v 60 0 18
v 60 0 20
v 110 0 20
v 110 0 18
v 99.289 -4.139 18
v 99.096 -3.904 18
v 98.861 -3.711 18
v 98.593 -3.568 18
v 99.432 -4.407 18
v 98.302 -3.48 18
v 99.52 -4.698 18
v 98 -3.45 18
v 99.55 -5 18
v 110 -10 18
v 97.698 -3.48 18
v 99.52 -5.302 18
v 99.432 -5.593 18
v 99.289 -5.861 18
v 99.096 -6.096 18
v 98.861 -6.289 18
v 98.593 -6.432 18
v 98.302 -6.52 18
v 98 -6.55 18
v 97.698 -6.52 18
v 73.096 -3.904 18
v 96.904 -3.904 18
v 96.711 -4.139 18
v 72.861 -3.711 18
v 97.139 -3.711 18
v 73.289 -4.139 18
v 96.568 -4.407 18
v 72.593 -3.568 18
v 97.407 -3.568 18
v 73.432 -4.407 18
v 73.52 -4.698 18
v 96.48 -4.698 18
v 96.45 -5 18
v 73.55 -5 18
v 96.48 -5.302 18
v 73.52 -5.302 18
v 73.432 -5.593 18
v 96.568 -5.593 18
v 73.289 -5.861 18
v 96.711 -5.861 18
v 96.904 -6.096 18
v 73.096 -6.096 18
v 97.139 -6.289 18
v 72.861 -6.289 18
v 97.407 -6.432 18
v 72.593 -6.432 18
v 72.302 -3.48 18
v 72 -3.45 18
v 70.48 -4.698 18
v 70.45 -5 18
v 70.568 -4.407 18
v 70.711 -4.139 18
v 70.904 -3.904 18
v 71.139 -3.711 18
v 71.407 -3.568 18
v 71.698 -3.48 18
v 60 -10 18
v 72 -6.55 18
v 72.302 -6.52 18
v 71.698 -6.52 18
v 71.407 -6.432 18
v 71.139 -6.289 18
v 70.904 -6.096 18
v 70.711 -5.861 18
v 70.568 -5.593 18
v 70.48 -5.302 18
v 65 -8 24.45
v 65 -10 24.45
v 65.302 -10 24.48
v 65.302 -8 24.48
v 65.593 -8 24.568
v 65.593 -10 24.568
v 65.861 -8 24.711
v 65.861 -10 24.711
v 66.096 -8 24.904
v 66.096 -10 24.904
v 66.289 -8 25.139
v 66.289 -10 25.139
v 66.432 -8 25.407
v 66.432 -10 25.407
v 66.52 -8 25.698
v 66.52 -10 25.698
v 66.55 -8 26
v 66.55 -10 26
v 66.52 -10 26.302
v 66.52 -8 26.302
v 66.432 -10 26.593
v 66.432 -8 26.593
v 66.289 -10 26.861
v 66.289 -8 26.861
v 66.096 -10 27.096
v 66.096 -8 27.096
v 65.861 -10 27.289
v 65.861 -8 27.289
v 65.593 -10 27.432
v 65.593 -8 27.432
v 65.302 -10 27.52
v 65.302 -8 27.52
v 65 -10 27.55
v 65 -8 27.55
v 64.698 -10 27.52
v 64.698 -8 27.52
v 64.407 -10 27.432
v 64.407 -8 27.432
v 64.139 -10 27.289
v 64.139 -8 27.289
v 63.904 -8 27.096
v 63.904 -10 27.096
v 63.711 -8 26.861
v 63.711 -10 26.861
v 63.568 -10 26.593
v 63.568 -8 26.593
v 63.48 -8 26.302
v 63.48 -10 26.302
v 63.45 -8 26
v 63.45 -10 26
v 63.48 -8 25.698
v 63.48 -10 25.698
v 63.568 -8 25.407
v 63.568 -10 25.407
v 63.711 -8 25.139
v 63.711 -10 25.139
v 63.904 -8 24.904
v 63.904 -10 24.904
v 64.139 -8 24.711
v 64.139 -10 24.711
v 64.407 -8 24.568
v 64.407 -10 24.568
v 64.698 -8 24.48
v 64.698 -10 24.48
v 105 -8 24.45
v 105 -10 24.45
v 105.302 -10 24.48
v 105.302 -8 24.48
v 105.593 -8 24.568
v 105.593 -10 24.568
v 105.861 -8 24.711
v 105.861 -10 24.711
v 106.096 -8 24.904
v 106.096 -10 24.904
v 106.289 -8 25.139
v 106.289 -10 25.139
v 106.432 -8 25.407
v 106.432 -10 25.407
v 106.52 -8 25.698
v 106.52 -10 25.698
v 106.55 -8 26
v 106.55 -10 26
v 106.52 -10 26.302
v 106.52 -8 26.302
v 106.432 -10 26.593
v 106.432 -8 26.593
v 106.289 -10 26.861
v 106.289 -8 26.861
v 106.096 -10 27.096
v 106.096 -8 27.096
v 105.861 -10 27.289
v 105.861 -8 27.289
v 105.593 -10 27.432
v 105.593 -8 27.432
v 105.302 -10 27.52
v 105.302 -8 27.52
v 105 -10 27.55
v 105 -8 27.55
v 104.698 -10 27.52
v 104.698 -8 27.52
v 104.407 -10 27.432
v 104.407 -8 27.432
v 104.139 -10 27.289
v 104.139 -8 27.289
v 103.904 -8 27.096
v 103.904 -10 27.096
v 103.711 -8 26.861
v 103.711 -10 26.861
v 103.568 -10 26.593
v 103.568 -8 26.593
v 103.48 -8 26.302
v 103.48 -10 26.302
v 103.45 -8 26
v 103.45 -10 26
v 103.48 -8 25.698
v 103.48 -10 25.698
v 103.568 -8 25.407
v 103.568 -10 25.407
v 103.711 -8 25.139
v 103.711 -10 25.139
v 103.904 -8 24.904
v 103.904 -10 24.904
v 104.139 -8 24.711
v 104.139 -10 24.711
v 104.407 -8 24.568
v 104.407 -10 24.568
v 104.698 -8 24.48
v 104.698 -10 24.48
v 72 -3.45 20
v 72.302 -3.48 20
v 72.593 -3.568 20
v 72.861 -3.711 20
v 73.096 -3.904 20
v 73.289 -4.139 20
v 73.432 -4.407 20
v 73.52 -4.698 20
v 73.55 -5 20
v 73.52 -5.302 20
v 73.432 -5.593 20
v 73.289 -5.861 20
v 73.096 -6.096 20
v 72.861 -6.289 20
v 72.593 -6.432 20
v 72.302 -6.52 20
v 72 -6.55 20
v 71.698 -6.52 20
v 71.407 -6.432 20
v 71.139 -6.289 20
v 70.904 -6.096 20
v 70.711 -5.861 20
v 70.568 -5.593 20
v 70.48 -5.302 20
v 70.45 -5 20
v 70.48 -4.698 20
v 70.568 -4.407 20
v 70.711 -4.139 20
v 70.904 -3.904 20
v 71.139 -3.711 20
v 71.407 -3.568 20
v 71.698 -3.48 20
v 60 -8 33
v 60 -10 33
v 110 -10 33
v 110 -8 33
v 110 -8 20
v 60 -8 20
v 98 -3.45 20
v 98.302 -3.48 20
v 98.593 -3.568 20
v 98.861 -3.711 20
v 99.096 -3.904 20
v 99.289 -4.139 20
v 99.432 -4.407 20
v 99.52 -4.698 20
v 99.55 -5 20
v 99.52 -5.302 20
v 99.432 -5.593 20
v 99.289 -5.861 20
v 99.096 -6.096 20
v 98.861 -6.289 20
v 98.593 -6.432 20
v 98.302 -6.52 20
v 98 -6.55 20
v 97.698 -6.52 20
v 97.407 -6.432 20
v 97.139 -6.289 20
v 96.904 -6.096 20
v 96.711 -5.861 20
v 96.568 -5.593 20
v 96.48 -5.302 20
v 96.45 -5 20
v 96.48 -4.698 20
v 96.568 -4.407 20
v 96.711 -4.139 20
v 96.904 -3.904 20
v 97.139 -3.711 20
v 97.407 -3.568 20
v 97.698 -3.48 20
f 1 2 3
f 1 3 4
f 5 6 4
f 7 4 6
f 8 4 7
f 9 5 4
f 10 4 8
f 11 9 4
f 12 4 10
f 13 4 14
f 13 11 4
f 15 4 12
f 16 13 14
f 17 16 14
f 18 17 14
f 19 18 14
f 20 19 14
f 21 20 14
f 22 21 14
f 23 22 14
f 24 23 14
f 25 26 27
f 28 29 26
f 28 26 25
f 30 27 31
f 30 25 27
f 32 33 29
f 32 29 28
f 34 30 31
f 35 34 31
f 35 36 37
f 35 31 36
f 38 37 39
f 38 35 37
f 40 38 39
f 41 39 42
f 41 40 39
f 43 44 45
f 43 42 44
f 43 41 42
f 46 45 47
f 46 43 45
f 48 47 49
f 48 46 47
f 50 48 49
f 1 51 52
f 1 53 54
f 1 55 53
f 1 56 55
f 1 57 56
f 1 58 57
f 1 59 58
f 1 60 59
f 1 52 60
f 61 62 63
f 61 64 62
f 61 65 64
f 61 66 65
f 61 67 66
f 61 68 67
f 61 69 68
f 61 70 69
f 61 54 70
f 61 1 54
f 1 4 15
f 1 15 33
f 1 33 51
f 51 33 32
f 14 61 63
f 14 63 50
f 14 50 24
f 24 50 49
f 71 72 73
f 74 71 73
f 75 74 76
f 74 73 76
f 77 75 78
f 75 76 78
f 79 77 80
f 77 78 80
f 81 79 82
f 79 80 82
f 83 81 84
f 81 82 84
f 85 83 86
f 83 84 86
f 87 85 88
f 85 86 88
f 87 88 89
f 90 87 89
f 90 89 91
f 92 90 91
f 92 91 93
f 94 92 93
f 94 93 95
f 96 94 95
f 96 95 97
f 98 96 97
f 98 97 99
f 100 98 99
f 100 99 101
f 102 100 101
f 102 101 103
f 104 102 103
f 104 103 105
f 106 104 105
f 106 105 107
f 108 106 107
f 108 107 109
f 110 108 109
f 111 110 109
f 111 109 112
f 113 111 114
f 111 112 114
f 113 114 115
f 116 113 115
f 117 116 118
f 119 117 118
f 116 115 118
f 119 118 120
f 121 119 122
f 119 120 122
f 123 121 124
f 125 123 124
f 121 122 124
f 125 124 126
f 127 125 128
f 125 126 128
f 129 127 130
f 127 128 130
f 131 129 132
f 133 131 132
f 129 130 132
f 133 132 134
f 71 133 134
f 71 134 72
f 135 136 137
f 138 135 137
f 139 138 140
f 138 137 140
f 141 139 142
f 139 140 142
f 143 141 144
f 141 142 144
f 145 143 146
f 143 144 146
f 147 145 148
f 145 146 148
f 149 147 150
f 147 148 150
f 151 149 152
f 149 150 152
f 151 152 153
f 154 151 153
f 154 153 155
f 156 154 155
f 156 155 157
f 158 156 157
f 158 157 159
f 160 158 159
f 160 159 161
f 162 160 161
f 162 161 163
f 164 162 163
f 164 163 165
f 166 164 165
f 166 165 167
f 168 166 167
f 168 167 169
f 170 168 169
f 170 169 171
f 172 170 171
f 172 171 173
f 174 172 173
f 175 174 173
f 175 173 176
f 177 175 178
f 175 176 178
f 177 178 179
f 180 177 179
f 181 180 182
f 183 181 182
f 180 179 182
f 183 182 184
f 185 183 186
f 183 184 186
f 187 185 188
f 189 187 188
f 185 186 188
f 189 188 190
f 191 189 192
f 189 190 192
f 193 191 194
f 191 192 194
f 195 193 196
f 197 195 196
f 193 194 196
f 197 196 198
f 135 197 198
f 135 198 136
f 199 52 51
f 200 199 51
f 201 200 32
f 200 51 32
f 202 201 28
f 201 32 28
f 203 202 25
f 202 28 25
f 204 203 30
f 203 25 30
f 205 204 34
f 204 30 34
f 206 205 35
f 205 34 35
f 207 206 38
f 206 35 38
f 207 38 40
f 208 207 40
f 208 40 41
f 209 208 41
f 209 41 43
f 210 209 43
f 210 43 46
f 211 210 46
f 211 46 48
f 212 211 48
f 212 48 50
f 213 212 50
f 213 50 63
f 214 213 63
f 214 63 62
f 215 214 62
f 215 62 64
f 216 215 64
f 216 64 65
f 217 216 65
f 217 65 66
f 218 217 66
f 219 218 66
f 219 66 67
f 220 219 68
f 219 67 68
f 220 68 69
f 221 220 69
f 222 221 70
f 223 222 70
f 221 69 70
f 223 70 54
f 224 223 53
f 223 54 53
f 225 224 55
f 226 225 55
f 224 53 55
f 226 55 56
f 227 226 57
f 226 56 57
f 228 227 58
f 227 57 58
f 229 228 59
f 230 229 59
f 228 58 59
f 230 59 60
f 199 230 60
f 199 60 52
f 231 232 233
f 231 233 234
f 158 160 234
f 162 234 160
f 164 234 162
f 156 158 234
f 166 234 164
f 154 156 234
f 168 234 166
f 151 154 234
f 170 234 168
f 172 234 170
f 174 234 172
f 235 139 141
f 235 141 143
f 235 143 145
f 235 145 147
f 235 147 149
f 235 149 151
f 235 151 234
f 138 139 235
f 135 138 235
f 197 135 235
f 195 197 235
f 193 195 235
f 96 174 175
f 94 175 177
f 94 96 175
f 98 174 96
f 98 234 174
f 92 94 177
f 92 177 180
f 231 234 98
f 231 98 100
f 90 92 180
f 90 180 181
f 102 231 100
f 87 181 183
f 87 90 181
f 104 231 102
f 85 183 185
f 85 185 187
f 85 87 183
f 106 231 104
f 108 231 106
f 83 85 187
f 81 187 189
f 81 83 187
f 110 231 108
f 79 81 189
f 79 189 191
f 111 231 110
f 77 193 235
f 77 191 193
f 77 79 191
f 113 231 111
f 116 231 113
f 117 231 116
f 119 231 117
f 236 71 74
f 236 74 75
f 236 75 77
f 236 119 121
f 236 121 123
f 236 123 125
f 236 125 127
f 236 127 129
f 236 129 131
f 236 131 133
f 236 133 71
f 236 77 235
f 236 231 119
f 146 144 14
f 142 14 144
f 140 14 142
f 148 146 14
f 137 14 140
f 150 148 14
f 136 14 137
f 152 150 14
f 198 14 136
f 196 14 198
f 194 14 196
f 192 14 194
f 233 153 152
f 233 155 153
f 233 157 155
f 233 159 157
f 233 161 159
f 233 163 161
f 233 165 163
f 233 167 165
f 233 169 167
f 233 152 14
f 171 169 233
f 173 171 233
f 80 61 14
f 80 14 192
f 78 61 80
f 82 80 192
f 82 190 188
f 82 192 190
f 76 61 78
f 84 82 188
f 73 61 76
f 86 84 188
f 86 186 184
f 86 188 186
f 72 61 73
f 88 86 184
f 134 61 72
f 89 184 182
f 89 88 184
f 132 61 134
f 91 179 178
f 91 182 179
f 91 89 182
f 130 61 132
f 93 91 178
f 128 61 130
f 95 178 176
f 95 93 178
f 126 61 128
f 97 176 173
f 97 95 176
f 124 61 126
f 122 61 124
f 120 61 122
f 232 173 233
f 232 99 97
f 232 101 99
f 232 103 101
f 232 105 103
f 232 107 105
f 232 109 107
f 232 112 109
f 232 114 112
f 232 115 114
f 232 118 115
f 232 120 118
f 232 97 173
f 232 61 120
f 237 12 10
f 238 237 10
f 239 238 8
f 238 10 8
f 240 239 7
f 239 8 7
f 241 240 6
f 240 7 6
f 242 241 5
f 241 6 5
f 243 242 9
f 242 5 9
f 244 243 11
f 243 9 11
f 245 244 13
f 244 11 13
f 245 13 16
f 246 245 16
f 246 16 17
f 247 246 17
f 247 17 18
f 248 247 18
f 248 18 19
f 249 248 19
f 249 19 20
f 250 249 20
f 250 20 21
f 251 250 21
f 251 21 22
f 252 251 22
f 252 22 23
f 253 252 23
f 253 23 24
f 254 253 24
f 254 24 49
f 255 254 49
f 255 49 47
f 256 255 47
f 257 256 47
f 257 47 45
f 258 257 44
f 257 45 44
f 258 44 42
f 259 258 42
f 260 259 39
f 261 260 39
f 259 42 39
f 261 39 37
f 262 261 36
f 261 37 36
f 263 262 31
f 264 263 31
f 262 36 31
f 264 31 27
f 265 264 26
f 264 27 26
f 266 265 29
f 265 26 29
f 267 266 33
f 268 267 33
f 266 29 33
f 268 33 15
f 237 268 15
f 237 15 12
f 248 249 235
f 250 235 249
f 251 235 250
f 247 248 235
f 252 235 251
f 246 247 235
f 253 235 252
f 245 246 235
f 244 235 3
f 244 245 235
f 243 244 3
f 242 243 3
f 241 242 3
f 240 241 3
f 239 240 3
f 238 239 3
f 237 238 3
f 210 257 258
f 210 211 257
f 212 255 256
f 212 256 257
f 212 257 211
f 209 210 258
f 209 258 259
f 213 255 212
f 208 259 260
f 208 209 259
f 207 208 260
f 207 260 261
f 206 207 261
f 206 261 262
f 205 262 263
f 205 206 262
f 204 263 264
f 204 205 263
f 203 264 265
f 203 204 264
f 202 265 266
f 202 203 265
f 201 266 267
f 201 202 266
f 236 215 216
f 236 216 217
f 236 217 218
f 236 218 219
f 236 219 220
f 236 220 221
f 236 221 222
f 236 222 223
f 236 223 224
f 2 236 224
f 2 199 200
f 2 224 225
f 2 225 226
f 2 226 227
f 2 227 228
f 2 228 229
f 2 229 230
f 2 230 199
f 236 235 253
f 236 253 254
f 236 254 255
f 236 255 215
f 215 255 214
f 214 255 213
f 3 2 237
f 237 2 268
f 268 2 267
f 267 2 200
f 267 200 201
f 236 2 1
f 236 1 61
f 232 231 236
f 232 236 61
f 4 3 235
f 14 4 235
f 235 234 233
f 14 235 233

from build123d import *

# Parameters (mm, degrees)
PAD041_DEPTH    = 50
SKETCH243_R     = 1.55
POCKET202_DEPTH = 15.001
SKETCH244_R     = 1.55
POCKET203_DEPTH = 10.001


with BuildPart() as part:
    # Sketch242 → Pad041 (new body)
    with BuildSketch(Plane.YZ):
        Polygon((0, 0), (0, 15), (2, 15), (2, 2), (10, 2), (10, 0), align=None)
    extrude(amount=PAD041_DEPTH)

    # Sketch243 (on Face6 of Pad041) → Pocket202 (cut, through all)
    with BuildSketch(Plane.YX):
        with Locations((5, 38)):
            Circle(SKETCH243_R)
        with Locations((5, 12)):
            Circle(SKETCH243_R)
    extrude(amount=-POCKET202_DEPTH, mode=Mode.SUBTRACT)

    # Sketch244 (on Face1 of Pocket202) → Pocket203 (cut, through all)
    with BuildSketch(Plane(origin=(0, 0, 0), x_dir=(0, 0, -1), z_dir=(0, -1, 0))):
        with Locations((-8, 45)):
            Circle(SKETCH244_R)
        with Locations((-8, 5)):
            Circle(SKETCH244_R)
    extrude(amount=-POCKET203_DEPTH, mode=Mode.SUBTRACT)


with BuildPart() as part_1:
    # Body042 placement: moved
    add(part.part.moved(Location((60, -10, 18))))


solid = part_1.part
